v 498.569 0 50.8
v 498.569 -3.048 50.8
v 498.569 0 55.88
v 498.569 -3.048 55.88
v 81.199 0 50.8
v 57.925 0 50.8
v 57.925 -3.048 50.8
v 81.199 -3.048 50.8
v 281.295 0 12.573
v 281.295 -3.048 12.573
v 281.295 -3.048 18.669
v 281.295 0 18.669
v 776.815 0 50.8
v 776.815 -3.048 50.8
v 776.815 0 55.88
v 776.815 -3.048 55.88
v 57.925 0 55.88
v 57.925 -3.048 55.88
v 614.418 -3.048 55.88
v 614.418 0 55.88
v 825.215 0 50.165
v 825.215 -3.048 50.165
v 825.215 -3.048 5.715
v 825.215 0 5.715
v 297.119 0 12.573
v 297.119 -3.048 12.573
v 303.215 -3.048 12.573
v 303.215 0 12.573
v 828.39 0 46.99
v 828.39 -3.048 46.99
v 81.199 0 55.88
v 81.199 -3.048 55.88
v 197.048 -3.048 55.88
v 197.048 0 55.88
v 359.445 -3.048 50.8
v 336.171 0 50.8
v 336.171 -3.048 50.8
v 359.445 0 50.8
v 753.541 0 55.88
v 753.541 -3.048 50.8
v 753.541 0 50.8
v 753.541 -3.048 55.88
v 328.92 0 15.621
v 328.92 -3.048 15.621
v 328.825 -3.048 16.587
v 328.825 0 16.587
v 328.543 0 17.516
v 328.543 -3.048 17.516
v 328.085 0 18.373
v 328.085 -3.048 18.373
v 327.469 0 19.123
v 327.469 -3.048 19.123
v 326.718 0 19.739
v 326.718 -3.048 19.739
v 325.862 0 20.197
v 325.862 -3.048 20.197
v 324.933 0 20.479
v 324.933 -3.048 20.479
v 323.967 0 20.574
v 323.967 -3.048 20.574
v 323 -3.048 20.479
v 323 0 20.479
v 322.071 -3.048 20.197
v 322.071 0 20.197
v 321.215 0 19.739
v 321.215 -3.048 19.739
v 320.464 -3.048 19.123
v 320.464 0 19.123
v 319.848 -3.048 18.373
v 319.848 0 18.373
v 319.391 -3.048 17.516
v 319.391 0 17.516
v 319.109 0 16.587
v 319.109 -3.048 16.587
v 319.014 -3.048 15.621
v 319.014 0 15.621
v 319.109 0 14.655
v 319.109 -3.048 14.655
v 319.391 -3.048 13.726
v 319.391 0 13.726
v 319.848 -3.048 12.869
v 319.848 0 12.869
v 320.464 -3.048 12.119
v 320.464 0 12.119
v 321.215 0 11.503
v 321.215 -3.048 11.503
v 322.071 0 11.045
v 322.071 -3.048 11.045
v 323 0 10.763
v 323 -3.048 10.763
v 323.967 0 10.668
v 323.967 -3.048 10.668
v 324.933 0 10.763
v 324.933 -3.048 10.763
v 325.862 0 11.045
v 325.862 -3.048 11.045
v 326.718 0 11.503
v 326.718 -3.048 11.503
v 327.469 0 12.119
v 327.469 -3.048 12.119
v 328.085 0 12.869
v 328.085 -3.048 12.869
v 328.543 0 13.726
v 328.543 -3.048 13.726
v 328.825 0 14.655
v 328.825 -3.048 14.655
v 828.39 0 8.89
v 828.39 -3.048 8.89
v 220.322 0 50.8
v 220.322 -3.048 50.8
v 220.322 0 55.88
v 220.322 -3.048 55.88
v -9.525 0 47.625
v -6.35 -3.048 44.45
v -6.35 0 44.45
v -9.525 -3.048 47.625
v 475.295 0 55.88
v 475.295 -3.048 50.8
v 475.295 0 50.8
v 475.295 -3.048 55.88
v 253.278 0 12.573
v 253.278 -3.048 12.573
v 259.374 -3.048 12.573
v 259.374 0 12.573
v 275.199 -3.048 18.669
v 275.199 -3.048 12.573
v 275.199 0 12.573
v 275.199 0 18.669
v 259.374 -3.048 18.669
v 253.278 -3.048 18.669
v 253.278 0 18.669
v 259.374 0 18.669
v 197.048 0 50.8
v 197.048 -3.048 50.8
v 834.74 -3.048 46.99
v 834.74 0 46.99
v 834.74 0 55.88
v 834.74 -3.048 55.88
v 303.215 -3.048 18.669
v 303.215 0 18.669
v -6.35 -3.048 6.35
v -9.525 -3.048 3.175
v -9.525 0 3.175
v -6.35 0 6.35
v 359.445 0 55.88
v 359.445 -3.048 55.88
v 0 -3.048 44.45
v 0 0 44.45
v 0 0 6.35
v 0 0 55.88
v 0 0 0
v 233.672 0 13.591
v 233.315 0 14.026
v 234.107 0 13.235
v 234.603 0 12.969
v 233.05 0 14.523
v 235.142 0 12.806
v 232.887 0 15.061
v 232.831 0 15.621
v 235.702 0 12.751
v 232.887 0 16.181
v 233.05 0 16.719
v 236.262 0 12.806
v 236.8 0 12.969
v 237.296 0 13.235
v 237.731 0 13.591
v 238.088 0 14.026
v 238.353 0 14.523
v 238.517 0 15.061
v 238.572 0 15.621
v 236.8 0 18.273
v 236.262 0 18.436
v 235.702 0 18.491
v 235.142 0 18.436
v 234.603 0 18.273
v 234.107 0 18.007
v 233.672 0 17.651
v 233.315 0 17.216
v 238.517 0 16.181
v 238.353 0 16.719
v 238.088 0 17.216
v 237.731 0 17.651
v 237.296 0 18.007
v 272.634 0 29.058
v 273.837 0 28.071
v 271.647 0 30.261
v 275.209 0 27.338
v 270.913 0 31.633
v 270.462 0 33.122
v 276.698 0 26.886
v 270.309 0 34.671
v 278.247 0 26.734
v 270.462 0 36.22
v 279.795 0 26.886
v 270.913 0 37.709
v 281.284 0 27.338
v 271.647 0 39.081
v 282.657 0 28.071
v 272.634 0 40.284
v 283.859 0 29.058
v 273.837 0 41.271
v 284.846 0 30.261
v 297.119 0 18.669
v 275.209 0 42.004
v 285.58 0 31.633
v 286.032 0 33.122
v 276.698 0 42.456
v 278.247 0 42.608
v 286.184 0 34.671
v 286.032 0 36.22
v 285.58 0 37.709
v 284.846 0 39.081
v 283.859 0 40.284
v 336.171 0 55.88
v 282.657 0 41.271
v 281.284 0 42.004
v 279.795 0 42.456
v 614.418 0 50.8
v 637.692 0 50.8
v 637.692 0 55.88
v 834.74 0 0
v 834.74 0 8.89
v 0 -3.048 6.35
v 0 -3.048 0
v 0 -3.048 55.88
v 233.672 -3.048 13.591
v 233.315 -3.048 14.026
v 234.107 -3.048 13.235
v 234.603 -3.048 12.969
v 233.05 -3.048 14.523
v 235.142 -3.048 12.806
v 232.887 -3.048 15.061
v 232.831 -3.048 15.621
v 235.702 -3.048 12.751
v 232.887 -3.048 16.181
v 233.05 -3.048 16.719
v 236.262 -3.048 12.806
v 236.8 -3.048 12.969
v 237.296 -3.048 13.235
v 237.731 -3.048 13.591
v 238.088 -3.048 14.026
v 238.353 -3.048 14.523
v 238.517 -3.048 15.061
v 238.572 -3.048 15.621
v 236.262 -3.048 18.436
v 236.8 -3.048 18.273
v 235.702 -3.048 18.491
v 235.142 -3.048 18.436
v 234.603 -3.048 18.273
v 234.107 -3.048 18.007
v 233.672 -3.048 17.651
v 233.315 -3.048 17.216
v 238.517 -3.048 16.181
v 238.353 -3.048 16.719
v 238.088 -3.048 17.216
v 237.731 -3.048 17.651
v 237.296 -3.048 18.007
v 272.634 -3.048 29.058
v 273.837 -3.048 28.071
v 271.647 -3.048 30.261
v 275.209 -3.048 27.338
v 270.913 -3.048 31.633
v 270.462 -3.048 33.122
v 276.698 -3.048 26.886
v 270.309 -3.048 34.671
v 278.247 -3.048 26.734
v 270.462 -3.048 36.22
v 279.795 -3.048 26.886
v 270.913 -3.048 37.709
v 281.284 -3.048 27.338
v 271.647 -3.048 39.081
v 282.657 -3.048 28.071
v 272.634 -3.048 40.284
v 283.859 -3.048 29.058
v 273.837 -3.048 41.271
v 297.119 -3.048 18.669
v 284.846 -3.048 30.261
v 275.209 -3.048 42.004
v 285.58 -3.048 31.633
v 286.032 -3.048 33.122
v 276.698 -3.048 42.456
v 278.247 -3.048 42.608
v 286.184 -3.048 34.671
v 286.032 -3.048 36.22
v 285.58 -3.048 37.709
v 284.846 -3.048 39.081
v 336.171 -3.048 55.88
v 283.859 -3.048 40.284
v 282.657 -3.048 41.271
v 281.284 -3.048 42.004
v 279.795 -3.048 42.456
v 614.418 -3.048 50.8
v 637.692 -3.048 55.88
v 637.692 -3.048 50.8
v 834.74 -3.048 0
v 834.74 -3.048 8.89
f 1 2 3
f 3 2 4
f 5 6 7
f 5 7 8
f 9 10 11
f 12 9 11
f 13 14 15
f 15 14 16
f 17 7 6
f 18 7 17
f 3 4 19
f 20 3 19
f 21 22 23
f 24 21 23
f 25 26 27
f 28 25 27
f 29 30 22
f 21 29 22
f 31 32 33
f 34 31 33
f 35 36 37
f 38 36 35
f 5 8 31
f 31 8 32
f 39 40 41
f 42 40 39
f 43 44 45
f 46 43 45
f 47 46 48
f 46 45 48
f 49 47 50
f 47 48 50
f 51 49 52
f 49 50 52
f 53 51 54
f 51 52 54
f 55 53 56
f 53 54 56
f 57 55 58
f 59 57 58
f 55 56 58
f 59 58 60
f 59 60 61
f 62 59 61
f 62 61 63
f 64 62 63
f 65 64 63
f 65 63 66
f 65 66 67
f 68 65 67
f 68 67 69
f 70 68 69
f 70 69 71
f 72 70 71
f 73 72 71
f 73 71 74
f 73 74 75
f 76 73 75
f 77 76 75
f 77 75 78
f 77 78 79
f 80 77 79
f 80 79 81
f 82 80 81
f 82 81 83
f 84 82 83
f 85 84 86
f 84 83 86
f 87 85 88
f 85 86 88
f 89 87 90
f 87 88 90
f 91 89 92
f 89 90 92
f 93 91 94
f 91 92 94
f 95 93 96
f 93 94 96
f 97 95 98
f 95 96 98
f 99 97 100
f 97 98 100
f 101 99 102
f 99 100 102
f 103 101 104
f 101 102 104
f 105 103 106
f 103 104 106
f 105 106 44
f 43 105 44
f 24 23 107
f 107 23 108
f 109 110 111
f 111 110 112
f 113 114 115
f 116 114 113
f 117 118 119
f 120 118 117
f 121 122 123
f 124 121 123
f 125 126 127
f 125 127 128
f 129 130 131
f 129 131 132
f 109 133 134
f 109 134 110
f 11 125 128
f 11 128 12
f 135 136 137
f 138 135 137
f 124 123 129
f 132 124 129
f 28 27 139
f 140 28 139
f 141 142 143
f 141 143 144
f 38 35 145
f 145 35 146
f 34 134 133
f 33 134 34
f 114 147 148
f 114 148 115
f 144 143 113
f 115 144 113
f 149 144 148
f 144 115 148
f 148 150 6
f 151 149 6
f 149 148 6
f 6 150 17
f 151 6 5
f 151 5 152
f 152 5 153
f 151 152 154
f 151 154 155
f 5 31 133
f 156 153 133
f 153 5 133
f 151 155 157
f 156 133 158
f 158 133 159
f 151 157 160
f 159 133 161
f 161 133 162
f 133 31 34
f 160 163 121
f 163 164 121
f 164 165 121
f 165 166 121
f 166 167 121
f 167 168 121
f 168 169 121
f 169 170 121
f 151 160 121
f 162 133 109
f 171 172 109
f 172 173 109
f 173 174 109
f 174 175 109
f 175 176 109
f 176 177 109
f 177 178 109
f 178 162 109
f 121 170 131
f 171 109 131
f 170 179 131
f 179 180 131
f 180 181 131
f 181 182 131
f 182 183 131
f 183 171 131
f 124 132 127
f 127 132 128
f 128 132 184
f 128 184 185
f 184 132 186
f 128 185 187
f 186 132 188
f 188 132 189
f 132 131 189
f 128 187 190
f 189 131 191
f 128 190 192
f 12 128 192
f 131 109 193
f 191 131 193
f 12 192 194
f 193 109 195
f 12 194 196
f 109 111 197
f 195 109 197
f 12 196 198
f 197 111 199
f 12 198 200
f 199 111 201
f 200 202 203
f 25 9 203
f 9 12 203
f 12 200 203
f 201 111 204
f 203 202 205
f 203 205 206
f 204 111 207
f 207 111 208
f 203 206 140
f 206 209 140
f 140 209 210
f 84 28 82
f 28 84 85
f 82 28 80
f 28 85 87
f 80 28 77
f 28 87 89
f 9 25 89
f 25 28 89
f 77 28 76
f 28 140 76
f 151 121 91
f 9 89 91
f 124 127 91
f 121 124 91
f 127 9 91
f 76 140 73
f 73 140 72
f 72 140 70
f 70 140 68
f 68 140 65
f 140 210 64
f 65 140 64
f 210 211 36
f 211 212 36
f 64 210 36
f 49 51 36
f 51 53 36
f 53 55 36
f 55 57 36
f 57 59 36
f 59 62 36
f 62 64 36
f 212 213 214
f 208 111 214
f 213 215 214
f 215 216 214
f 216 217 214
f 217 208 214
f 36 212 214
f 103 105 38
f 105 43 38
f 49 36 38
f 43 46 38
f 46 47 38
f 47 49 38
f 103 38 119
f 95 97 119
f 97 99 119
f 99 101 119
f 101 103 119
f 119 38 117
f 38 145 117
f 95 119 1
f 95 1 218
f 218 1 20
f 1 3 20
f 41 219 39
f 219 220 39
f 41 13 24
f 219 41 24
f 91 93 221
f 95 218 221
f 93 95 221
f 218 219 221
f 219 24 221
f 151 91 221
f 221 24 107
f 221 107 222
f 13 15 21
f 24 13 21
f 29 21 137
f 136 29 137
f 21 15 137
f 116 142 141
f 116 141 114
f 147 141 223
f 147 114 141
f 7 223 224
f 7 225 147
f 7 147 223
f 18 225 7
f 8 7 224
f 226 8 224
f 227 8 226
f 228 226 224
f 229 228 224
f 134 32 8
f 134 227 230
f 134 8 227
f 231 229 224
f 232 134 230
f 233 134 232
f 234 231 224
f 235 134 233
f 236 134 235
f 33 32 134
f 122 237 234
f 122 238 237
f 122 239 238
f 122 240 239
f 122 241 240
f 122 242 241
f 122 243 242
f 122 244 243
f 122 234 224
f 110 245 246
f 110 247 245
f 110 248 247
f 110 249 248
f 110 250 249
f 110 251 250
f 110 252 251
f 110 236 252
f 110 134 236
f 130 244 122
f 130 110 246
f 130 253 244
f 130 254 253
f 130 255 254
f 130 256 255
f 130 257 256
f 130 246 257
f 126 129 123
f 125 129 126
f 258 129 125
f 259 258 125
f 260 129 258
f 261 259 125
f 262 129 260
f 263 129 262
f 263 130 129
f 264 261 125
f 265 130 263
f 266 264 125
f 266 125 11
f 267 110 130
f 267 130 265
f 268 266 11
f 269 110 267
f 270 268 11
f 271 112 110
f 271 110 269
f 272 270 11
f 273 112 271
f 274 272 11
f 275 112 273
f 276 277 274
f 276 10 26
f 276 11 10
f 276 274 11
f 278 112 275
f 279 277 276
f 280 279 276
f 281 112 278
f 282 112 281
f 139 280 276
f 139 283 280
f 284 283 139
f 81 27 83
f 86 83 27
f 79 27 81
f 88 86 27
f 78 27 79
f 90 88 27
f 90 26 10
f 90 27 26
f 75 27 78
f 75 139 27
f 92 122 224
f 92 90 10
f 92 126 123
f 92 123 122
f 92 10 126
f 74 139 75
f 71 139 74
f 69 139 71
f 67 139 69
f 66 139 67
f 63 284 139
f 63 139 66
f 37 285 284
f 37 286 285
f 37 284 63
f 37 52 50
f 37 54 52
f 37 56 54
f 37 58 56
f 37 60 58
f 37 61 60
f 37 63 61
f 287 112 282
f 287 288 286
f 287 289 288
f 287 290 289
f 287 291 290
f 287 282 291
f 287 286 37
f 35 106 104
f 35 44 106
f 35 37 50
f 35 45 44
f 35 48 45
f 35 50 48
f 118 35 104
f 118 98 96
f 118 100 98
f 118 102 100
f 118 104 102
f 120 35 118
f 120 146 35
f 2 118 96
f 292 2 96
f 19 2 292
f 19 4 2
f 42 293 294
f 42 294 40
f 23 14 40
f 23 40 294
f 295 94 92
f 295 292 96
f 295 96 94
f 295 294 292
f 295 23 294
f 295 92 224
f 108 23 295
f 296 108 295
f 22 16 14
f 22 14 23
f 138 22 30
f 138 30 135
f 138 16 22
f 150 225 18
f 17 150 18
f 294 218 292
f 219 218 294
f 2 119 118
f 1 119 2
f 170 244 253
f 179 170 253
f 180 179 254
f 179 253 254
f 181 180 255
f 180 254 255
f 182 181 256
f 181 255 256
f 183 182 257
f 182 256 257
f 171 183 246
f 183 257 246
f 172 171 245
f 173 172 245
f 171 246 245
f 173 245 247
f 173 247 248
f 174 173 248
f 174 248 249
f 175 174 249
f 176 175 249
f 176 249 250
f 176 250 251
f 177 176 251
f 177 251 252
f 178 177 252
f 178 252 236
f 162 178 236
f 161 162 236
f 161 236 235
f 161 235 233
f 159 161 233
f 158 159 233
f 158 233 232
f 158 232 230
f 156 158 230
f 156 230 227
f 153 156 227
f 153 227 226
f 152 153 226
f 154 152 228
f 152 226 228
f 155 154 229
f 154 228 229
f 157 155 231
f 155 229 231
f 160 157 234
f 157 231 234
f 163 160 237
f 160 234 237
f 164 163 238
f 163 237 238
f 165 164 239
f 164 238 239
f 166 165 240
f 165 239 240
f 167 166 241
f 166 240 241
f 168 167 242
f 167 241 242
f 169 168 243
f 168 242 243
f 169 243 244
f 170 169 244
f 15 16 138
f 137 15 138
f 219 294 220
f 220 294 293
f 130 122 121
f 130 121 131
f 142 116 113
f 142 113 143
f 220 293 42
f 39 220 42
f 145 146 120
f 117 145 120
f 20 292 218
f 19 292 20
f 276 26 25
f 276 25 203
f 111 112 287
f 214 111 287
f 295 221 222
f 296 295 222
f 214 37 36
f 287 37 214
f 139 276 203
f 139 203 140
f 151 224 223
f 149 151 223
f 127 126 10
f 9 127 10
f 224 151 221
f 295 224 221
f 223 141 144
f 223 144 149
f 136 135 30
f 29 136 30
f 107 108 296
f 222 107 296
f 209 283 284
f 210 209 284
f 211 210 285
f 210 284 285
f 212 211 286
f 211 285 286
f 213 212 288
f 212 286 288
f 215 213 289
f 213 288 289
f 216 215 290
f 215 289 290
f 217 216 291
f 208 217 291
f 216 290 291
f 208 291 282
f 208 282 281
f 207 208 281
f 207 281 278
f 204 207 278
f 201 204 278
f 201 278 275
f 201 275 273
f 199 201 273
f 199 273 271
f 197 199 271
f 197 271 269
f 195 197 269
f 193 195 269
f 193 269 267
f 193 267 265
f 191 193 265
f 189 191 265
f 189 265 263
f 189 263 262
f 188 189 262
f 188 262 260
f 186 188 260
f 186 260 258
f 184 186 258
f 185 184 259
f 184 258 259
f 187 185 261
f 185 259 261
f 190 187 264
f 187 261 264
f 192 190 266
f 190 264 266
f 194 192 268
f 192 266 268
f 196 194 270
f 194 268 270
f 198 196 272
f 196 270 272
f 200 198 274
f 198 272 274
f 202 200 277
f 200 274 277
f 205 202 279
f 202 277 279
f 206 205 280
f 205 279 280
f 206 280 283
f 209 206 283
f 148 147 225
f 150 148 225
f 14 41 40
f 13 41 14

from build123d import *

# Parameters (mm, degrees)
F0_W     = 834.7400754492
F0_H     = 50.8
F1_DEPTH = 3.048
F3_W     = 57.9247
F3_H     = 5.08
F3_W_2   = 115.8494
F4_DEPTH = 3.048
F6_DEPTH = 3.048
F7_DEPTH = 3.049
F8_W     = 6.096
F8_H     = 6.096
F8_R     = 2.8702
F8_R_2   = 4.953
F8_R_3   = 7.9375
F9_DEPTH = 3.049


# Not quite as in the source:
# - a feature names something its author has since deleted; it is built from what else it names


with BuildPart() as f1:
    # F0 (on Front) → F1 (new body)
    with BuildSketch(Plane.XZ):
        with Locations((417.3700377246, 25.4)):
            Rectangle(F0_W, F0_H)
    extrude(amount=F1_DEPTH)

    # F3 (on face) → F4 (join)
    with BuildSketch(Plane.XZ.offset(3.048)):
        with Locations((28.96235, 53.34)):
            Rectangle(F3_W, F3_H)
        with Locations((139.1233459082, 53.34)):
            Rectangle(F3_W_2, F3_H)
        with Locations((278.2466918164, 53.34)):
            Rectangle(F3_W_2, F3_H)
        with Locations((417.3700377246, 53.34)):
            Rectangle(F3_W_2, F3_H)
        with Locations((556.4933836328, 53.34)):
            Rectangle(F3_W_2, F3_H)
        with Locations((695.616729541, 53.34)):
            Rectangle(F3_W_2, F3_H)
        with Locations((805.7777254492, 53.34)):
            Rectangle(F3_W, F3_H)
    extrude(amount=-F4_DEPTH)

    # F5 (on face) → F6 (join)
    with BuildSketch(Plane.XZ.offset(3.048)):
        Polygon((-6.35, 6.35), (0, 6.35), (0, 44.45), (-6.35, 44.45), (-9.525, 47.625), (-9.525, 3.175), align=None)
    extrude(amount=-F6_DEPTH)

    # F5 (on face) → F7 (cut, through all)
    with BuildSketch(Plane.XZ.offset(3.048)):
        Polygon((828.3900754492, 8.89), (834.7400754492, 8.89), (834.7400754492, 46.99), (828.3900754492, 46.99), (825.2150754492, 50.165), (825.2150754492, 5.715), align=None)
    extrude(amount=-F7_DEPTH, mode=Mode.SUBTRACT)

    # F8 (on face) → F9 (cut, through all)
    with BuildSketch(Plane.XZ.offset(3.048)):
        with Locations((256.3264918164, 15.621)):
            Rectangle(F8_W, F8_H)
        with Locations((278.2466918164, 15.621)):
            Rectangle(F8_W, F8_H)
        with Locations((300.1668918164, 15.621)):
            Rectangle(F8_W, F8_H)
        with Locations((235.7016918164, 15.621)):
            Circle(F8_R)
        with Locations((323.9666918164, 15.621)):
            Circle(F8_R_2)
        with Locations((278.2466918164, 34.671)):
            Circle(F8_R_3)
    extrude(amount=-F9_DEPTH, mode=Mode.SUBTRACT)


solid = f1.part
